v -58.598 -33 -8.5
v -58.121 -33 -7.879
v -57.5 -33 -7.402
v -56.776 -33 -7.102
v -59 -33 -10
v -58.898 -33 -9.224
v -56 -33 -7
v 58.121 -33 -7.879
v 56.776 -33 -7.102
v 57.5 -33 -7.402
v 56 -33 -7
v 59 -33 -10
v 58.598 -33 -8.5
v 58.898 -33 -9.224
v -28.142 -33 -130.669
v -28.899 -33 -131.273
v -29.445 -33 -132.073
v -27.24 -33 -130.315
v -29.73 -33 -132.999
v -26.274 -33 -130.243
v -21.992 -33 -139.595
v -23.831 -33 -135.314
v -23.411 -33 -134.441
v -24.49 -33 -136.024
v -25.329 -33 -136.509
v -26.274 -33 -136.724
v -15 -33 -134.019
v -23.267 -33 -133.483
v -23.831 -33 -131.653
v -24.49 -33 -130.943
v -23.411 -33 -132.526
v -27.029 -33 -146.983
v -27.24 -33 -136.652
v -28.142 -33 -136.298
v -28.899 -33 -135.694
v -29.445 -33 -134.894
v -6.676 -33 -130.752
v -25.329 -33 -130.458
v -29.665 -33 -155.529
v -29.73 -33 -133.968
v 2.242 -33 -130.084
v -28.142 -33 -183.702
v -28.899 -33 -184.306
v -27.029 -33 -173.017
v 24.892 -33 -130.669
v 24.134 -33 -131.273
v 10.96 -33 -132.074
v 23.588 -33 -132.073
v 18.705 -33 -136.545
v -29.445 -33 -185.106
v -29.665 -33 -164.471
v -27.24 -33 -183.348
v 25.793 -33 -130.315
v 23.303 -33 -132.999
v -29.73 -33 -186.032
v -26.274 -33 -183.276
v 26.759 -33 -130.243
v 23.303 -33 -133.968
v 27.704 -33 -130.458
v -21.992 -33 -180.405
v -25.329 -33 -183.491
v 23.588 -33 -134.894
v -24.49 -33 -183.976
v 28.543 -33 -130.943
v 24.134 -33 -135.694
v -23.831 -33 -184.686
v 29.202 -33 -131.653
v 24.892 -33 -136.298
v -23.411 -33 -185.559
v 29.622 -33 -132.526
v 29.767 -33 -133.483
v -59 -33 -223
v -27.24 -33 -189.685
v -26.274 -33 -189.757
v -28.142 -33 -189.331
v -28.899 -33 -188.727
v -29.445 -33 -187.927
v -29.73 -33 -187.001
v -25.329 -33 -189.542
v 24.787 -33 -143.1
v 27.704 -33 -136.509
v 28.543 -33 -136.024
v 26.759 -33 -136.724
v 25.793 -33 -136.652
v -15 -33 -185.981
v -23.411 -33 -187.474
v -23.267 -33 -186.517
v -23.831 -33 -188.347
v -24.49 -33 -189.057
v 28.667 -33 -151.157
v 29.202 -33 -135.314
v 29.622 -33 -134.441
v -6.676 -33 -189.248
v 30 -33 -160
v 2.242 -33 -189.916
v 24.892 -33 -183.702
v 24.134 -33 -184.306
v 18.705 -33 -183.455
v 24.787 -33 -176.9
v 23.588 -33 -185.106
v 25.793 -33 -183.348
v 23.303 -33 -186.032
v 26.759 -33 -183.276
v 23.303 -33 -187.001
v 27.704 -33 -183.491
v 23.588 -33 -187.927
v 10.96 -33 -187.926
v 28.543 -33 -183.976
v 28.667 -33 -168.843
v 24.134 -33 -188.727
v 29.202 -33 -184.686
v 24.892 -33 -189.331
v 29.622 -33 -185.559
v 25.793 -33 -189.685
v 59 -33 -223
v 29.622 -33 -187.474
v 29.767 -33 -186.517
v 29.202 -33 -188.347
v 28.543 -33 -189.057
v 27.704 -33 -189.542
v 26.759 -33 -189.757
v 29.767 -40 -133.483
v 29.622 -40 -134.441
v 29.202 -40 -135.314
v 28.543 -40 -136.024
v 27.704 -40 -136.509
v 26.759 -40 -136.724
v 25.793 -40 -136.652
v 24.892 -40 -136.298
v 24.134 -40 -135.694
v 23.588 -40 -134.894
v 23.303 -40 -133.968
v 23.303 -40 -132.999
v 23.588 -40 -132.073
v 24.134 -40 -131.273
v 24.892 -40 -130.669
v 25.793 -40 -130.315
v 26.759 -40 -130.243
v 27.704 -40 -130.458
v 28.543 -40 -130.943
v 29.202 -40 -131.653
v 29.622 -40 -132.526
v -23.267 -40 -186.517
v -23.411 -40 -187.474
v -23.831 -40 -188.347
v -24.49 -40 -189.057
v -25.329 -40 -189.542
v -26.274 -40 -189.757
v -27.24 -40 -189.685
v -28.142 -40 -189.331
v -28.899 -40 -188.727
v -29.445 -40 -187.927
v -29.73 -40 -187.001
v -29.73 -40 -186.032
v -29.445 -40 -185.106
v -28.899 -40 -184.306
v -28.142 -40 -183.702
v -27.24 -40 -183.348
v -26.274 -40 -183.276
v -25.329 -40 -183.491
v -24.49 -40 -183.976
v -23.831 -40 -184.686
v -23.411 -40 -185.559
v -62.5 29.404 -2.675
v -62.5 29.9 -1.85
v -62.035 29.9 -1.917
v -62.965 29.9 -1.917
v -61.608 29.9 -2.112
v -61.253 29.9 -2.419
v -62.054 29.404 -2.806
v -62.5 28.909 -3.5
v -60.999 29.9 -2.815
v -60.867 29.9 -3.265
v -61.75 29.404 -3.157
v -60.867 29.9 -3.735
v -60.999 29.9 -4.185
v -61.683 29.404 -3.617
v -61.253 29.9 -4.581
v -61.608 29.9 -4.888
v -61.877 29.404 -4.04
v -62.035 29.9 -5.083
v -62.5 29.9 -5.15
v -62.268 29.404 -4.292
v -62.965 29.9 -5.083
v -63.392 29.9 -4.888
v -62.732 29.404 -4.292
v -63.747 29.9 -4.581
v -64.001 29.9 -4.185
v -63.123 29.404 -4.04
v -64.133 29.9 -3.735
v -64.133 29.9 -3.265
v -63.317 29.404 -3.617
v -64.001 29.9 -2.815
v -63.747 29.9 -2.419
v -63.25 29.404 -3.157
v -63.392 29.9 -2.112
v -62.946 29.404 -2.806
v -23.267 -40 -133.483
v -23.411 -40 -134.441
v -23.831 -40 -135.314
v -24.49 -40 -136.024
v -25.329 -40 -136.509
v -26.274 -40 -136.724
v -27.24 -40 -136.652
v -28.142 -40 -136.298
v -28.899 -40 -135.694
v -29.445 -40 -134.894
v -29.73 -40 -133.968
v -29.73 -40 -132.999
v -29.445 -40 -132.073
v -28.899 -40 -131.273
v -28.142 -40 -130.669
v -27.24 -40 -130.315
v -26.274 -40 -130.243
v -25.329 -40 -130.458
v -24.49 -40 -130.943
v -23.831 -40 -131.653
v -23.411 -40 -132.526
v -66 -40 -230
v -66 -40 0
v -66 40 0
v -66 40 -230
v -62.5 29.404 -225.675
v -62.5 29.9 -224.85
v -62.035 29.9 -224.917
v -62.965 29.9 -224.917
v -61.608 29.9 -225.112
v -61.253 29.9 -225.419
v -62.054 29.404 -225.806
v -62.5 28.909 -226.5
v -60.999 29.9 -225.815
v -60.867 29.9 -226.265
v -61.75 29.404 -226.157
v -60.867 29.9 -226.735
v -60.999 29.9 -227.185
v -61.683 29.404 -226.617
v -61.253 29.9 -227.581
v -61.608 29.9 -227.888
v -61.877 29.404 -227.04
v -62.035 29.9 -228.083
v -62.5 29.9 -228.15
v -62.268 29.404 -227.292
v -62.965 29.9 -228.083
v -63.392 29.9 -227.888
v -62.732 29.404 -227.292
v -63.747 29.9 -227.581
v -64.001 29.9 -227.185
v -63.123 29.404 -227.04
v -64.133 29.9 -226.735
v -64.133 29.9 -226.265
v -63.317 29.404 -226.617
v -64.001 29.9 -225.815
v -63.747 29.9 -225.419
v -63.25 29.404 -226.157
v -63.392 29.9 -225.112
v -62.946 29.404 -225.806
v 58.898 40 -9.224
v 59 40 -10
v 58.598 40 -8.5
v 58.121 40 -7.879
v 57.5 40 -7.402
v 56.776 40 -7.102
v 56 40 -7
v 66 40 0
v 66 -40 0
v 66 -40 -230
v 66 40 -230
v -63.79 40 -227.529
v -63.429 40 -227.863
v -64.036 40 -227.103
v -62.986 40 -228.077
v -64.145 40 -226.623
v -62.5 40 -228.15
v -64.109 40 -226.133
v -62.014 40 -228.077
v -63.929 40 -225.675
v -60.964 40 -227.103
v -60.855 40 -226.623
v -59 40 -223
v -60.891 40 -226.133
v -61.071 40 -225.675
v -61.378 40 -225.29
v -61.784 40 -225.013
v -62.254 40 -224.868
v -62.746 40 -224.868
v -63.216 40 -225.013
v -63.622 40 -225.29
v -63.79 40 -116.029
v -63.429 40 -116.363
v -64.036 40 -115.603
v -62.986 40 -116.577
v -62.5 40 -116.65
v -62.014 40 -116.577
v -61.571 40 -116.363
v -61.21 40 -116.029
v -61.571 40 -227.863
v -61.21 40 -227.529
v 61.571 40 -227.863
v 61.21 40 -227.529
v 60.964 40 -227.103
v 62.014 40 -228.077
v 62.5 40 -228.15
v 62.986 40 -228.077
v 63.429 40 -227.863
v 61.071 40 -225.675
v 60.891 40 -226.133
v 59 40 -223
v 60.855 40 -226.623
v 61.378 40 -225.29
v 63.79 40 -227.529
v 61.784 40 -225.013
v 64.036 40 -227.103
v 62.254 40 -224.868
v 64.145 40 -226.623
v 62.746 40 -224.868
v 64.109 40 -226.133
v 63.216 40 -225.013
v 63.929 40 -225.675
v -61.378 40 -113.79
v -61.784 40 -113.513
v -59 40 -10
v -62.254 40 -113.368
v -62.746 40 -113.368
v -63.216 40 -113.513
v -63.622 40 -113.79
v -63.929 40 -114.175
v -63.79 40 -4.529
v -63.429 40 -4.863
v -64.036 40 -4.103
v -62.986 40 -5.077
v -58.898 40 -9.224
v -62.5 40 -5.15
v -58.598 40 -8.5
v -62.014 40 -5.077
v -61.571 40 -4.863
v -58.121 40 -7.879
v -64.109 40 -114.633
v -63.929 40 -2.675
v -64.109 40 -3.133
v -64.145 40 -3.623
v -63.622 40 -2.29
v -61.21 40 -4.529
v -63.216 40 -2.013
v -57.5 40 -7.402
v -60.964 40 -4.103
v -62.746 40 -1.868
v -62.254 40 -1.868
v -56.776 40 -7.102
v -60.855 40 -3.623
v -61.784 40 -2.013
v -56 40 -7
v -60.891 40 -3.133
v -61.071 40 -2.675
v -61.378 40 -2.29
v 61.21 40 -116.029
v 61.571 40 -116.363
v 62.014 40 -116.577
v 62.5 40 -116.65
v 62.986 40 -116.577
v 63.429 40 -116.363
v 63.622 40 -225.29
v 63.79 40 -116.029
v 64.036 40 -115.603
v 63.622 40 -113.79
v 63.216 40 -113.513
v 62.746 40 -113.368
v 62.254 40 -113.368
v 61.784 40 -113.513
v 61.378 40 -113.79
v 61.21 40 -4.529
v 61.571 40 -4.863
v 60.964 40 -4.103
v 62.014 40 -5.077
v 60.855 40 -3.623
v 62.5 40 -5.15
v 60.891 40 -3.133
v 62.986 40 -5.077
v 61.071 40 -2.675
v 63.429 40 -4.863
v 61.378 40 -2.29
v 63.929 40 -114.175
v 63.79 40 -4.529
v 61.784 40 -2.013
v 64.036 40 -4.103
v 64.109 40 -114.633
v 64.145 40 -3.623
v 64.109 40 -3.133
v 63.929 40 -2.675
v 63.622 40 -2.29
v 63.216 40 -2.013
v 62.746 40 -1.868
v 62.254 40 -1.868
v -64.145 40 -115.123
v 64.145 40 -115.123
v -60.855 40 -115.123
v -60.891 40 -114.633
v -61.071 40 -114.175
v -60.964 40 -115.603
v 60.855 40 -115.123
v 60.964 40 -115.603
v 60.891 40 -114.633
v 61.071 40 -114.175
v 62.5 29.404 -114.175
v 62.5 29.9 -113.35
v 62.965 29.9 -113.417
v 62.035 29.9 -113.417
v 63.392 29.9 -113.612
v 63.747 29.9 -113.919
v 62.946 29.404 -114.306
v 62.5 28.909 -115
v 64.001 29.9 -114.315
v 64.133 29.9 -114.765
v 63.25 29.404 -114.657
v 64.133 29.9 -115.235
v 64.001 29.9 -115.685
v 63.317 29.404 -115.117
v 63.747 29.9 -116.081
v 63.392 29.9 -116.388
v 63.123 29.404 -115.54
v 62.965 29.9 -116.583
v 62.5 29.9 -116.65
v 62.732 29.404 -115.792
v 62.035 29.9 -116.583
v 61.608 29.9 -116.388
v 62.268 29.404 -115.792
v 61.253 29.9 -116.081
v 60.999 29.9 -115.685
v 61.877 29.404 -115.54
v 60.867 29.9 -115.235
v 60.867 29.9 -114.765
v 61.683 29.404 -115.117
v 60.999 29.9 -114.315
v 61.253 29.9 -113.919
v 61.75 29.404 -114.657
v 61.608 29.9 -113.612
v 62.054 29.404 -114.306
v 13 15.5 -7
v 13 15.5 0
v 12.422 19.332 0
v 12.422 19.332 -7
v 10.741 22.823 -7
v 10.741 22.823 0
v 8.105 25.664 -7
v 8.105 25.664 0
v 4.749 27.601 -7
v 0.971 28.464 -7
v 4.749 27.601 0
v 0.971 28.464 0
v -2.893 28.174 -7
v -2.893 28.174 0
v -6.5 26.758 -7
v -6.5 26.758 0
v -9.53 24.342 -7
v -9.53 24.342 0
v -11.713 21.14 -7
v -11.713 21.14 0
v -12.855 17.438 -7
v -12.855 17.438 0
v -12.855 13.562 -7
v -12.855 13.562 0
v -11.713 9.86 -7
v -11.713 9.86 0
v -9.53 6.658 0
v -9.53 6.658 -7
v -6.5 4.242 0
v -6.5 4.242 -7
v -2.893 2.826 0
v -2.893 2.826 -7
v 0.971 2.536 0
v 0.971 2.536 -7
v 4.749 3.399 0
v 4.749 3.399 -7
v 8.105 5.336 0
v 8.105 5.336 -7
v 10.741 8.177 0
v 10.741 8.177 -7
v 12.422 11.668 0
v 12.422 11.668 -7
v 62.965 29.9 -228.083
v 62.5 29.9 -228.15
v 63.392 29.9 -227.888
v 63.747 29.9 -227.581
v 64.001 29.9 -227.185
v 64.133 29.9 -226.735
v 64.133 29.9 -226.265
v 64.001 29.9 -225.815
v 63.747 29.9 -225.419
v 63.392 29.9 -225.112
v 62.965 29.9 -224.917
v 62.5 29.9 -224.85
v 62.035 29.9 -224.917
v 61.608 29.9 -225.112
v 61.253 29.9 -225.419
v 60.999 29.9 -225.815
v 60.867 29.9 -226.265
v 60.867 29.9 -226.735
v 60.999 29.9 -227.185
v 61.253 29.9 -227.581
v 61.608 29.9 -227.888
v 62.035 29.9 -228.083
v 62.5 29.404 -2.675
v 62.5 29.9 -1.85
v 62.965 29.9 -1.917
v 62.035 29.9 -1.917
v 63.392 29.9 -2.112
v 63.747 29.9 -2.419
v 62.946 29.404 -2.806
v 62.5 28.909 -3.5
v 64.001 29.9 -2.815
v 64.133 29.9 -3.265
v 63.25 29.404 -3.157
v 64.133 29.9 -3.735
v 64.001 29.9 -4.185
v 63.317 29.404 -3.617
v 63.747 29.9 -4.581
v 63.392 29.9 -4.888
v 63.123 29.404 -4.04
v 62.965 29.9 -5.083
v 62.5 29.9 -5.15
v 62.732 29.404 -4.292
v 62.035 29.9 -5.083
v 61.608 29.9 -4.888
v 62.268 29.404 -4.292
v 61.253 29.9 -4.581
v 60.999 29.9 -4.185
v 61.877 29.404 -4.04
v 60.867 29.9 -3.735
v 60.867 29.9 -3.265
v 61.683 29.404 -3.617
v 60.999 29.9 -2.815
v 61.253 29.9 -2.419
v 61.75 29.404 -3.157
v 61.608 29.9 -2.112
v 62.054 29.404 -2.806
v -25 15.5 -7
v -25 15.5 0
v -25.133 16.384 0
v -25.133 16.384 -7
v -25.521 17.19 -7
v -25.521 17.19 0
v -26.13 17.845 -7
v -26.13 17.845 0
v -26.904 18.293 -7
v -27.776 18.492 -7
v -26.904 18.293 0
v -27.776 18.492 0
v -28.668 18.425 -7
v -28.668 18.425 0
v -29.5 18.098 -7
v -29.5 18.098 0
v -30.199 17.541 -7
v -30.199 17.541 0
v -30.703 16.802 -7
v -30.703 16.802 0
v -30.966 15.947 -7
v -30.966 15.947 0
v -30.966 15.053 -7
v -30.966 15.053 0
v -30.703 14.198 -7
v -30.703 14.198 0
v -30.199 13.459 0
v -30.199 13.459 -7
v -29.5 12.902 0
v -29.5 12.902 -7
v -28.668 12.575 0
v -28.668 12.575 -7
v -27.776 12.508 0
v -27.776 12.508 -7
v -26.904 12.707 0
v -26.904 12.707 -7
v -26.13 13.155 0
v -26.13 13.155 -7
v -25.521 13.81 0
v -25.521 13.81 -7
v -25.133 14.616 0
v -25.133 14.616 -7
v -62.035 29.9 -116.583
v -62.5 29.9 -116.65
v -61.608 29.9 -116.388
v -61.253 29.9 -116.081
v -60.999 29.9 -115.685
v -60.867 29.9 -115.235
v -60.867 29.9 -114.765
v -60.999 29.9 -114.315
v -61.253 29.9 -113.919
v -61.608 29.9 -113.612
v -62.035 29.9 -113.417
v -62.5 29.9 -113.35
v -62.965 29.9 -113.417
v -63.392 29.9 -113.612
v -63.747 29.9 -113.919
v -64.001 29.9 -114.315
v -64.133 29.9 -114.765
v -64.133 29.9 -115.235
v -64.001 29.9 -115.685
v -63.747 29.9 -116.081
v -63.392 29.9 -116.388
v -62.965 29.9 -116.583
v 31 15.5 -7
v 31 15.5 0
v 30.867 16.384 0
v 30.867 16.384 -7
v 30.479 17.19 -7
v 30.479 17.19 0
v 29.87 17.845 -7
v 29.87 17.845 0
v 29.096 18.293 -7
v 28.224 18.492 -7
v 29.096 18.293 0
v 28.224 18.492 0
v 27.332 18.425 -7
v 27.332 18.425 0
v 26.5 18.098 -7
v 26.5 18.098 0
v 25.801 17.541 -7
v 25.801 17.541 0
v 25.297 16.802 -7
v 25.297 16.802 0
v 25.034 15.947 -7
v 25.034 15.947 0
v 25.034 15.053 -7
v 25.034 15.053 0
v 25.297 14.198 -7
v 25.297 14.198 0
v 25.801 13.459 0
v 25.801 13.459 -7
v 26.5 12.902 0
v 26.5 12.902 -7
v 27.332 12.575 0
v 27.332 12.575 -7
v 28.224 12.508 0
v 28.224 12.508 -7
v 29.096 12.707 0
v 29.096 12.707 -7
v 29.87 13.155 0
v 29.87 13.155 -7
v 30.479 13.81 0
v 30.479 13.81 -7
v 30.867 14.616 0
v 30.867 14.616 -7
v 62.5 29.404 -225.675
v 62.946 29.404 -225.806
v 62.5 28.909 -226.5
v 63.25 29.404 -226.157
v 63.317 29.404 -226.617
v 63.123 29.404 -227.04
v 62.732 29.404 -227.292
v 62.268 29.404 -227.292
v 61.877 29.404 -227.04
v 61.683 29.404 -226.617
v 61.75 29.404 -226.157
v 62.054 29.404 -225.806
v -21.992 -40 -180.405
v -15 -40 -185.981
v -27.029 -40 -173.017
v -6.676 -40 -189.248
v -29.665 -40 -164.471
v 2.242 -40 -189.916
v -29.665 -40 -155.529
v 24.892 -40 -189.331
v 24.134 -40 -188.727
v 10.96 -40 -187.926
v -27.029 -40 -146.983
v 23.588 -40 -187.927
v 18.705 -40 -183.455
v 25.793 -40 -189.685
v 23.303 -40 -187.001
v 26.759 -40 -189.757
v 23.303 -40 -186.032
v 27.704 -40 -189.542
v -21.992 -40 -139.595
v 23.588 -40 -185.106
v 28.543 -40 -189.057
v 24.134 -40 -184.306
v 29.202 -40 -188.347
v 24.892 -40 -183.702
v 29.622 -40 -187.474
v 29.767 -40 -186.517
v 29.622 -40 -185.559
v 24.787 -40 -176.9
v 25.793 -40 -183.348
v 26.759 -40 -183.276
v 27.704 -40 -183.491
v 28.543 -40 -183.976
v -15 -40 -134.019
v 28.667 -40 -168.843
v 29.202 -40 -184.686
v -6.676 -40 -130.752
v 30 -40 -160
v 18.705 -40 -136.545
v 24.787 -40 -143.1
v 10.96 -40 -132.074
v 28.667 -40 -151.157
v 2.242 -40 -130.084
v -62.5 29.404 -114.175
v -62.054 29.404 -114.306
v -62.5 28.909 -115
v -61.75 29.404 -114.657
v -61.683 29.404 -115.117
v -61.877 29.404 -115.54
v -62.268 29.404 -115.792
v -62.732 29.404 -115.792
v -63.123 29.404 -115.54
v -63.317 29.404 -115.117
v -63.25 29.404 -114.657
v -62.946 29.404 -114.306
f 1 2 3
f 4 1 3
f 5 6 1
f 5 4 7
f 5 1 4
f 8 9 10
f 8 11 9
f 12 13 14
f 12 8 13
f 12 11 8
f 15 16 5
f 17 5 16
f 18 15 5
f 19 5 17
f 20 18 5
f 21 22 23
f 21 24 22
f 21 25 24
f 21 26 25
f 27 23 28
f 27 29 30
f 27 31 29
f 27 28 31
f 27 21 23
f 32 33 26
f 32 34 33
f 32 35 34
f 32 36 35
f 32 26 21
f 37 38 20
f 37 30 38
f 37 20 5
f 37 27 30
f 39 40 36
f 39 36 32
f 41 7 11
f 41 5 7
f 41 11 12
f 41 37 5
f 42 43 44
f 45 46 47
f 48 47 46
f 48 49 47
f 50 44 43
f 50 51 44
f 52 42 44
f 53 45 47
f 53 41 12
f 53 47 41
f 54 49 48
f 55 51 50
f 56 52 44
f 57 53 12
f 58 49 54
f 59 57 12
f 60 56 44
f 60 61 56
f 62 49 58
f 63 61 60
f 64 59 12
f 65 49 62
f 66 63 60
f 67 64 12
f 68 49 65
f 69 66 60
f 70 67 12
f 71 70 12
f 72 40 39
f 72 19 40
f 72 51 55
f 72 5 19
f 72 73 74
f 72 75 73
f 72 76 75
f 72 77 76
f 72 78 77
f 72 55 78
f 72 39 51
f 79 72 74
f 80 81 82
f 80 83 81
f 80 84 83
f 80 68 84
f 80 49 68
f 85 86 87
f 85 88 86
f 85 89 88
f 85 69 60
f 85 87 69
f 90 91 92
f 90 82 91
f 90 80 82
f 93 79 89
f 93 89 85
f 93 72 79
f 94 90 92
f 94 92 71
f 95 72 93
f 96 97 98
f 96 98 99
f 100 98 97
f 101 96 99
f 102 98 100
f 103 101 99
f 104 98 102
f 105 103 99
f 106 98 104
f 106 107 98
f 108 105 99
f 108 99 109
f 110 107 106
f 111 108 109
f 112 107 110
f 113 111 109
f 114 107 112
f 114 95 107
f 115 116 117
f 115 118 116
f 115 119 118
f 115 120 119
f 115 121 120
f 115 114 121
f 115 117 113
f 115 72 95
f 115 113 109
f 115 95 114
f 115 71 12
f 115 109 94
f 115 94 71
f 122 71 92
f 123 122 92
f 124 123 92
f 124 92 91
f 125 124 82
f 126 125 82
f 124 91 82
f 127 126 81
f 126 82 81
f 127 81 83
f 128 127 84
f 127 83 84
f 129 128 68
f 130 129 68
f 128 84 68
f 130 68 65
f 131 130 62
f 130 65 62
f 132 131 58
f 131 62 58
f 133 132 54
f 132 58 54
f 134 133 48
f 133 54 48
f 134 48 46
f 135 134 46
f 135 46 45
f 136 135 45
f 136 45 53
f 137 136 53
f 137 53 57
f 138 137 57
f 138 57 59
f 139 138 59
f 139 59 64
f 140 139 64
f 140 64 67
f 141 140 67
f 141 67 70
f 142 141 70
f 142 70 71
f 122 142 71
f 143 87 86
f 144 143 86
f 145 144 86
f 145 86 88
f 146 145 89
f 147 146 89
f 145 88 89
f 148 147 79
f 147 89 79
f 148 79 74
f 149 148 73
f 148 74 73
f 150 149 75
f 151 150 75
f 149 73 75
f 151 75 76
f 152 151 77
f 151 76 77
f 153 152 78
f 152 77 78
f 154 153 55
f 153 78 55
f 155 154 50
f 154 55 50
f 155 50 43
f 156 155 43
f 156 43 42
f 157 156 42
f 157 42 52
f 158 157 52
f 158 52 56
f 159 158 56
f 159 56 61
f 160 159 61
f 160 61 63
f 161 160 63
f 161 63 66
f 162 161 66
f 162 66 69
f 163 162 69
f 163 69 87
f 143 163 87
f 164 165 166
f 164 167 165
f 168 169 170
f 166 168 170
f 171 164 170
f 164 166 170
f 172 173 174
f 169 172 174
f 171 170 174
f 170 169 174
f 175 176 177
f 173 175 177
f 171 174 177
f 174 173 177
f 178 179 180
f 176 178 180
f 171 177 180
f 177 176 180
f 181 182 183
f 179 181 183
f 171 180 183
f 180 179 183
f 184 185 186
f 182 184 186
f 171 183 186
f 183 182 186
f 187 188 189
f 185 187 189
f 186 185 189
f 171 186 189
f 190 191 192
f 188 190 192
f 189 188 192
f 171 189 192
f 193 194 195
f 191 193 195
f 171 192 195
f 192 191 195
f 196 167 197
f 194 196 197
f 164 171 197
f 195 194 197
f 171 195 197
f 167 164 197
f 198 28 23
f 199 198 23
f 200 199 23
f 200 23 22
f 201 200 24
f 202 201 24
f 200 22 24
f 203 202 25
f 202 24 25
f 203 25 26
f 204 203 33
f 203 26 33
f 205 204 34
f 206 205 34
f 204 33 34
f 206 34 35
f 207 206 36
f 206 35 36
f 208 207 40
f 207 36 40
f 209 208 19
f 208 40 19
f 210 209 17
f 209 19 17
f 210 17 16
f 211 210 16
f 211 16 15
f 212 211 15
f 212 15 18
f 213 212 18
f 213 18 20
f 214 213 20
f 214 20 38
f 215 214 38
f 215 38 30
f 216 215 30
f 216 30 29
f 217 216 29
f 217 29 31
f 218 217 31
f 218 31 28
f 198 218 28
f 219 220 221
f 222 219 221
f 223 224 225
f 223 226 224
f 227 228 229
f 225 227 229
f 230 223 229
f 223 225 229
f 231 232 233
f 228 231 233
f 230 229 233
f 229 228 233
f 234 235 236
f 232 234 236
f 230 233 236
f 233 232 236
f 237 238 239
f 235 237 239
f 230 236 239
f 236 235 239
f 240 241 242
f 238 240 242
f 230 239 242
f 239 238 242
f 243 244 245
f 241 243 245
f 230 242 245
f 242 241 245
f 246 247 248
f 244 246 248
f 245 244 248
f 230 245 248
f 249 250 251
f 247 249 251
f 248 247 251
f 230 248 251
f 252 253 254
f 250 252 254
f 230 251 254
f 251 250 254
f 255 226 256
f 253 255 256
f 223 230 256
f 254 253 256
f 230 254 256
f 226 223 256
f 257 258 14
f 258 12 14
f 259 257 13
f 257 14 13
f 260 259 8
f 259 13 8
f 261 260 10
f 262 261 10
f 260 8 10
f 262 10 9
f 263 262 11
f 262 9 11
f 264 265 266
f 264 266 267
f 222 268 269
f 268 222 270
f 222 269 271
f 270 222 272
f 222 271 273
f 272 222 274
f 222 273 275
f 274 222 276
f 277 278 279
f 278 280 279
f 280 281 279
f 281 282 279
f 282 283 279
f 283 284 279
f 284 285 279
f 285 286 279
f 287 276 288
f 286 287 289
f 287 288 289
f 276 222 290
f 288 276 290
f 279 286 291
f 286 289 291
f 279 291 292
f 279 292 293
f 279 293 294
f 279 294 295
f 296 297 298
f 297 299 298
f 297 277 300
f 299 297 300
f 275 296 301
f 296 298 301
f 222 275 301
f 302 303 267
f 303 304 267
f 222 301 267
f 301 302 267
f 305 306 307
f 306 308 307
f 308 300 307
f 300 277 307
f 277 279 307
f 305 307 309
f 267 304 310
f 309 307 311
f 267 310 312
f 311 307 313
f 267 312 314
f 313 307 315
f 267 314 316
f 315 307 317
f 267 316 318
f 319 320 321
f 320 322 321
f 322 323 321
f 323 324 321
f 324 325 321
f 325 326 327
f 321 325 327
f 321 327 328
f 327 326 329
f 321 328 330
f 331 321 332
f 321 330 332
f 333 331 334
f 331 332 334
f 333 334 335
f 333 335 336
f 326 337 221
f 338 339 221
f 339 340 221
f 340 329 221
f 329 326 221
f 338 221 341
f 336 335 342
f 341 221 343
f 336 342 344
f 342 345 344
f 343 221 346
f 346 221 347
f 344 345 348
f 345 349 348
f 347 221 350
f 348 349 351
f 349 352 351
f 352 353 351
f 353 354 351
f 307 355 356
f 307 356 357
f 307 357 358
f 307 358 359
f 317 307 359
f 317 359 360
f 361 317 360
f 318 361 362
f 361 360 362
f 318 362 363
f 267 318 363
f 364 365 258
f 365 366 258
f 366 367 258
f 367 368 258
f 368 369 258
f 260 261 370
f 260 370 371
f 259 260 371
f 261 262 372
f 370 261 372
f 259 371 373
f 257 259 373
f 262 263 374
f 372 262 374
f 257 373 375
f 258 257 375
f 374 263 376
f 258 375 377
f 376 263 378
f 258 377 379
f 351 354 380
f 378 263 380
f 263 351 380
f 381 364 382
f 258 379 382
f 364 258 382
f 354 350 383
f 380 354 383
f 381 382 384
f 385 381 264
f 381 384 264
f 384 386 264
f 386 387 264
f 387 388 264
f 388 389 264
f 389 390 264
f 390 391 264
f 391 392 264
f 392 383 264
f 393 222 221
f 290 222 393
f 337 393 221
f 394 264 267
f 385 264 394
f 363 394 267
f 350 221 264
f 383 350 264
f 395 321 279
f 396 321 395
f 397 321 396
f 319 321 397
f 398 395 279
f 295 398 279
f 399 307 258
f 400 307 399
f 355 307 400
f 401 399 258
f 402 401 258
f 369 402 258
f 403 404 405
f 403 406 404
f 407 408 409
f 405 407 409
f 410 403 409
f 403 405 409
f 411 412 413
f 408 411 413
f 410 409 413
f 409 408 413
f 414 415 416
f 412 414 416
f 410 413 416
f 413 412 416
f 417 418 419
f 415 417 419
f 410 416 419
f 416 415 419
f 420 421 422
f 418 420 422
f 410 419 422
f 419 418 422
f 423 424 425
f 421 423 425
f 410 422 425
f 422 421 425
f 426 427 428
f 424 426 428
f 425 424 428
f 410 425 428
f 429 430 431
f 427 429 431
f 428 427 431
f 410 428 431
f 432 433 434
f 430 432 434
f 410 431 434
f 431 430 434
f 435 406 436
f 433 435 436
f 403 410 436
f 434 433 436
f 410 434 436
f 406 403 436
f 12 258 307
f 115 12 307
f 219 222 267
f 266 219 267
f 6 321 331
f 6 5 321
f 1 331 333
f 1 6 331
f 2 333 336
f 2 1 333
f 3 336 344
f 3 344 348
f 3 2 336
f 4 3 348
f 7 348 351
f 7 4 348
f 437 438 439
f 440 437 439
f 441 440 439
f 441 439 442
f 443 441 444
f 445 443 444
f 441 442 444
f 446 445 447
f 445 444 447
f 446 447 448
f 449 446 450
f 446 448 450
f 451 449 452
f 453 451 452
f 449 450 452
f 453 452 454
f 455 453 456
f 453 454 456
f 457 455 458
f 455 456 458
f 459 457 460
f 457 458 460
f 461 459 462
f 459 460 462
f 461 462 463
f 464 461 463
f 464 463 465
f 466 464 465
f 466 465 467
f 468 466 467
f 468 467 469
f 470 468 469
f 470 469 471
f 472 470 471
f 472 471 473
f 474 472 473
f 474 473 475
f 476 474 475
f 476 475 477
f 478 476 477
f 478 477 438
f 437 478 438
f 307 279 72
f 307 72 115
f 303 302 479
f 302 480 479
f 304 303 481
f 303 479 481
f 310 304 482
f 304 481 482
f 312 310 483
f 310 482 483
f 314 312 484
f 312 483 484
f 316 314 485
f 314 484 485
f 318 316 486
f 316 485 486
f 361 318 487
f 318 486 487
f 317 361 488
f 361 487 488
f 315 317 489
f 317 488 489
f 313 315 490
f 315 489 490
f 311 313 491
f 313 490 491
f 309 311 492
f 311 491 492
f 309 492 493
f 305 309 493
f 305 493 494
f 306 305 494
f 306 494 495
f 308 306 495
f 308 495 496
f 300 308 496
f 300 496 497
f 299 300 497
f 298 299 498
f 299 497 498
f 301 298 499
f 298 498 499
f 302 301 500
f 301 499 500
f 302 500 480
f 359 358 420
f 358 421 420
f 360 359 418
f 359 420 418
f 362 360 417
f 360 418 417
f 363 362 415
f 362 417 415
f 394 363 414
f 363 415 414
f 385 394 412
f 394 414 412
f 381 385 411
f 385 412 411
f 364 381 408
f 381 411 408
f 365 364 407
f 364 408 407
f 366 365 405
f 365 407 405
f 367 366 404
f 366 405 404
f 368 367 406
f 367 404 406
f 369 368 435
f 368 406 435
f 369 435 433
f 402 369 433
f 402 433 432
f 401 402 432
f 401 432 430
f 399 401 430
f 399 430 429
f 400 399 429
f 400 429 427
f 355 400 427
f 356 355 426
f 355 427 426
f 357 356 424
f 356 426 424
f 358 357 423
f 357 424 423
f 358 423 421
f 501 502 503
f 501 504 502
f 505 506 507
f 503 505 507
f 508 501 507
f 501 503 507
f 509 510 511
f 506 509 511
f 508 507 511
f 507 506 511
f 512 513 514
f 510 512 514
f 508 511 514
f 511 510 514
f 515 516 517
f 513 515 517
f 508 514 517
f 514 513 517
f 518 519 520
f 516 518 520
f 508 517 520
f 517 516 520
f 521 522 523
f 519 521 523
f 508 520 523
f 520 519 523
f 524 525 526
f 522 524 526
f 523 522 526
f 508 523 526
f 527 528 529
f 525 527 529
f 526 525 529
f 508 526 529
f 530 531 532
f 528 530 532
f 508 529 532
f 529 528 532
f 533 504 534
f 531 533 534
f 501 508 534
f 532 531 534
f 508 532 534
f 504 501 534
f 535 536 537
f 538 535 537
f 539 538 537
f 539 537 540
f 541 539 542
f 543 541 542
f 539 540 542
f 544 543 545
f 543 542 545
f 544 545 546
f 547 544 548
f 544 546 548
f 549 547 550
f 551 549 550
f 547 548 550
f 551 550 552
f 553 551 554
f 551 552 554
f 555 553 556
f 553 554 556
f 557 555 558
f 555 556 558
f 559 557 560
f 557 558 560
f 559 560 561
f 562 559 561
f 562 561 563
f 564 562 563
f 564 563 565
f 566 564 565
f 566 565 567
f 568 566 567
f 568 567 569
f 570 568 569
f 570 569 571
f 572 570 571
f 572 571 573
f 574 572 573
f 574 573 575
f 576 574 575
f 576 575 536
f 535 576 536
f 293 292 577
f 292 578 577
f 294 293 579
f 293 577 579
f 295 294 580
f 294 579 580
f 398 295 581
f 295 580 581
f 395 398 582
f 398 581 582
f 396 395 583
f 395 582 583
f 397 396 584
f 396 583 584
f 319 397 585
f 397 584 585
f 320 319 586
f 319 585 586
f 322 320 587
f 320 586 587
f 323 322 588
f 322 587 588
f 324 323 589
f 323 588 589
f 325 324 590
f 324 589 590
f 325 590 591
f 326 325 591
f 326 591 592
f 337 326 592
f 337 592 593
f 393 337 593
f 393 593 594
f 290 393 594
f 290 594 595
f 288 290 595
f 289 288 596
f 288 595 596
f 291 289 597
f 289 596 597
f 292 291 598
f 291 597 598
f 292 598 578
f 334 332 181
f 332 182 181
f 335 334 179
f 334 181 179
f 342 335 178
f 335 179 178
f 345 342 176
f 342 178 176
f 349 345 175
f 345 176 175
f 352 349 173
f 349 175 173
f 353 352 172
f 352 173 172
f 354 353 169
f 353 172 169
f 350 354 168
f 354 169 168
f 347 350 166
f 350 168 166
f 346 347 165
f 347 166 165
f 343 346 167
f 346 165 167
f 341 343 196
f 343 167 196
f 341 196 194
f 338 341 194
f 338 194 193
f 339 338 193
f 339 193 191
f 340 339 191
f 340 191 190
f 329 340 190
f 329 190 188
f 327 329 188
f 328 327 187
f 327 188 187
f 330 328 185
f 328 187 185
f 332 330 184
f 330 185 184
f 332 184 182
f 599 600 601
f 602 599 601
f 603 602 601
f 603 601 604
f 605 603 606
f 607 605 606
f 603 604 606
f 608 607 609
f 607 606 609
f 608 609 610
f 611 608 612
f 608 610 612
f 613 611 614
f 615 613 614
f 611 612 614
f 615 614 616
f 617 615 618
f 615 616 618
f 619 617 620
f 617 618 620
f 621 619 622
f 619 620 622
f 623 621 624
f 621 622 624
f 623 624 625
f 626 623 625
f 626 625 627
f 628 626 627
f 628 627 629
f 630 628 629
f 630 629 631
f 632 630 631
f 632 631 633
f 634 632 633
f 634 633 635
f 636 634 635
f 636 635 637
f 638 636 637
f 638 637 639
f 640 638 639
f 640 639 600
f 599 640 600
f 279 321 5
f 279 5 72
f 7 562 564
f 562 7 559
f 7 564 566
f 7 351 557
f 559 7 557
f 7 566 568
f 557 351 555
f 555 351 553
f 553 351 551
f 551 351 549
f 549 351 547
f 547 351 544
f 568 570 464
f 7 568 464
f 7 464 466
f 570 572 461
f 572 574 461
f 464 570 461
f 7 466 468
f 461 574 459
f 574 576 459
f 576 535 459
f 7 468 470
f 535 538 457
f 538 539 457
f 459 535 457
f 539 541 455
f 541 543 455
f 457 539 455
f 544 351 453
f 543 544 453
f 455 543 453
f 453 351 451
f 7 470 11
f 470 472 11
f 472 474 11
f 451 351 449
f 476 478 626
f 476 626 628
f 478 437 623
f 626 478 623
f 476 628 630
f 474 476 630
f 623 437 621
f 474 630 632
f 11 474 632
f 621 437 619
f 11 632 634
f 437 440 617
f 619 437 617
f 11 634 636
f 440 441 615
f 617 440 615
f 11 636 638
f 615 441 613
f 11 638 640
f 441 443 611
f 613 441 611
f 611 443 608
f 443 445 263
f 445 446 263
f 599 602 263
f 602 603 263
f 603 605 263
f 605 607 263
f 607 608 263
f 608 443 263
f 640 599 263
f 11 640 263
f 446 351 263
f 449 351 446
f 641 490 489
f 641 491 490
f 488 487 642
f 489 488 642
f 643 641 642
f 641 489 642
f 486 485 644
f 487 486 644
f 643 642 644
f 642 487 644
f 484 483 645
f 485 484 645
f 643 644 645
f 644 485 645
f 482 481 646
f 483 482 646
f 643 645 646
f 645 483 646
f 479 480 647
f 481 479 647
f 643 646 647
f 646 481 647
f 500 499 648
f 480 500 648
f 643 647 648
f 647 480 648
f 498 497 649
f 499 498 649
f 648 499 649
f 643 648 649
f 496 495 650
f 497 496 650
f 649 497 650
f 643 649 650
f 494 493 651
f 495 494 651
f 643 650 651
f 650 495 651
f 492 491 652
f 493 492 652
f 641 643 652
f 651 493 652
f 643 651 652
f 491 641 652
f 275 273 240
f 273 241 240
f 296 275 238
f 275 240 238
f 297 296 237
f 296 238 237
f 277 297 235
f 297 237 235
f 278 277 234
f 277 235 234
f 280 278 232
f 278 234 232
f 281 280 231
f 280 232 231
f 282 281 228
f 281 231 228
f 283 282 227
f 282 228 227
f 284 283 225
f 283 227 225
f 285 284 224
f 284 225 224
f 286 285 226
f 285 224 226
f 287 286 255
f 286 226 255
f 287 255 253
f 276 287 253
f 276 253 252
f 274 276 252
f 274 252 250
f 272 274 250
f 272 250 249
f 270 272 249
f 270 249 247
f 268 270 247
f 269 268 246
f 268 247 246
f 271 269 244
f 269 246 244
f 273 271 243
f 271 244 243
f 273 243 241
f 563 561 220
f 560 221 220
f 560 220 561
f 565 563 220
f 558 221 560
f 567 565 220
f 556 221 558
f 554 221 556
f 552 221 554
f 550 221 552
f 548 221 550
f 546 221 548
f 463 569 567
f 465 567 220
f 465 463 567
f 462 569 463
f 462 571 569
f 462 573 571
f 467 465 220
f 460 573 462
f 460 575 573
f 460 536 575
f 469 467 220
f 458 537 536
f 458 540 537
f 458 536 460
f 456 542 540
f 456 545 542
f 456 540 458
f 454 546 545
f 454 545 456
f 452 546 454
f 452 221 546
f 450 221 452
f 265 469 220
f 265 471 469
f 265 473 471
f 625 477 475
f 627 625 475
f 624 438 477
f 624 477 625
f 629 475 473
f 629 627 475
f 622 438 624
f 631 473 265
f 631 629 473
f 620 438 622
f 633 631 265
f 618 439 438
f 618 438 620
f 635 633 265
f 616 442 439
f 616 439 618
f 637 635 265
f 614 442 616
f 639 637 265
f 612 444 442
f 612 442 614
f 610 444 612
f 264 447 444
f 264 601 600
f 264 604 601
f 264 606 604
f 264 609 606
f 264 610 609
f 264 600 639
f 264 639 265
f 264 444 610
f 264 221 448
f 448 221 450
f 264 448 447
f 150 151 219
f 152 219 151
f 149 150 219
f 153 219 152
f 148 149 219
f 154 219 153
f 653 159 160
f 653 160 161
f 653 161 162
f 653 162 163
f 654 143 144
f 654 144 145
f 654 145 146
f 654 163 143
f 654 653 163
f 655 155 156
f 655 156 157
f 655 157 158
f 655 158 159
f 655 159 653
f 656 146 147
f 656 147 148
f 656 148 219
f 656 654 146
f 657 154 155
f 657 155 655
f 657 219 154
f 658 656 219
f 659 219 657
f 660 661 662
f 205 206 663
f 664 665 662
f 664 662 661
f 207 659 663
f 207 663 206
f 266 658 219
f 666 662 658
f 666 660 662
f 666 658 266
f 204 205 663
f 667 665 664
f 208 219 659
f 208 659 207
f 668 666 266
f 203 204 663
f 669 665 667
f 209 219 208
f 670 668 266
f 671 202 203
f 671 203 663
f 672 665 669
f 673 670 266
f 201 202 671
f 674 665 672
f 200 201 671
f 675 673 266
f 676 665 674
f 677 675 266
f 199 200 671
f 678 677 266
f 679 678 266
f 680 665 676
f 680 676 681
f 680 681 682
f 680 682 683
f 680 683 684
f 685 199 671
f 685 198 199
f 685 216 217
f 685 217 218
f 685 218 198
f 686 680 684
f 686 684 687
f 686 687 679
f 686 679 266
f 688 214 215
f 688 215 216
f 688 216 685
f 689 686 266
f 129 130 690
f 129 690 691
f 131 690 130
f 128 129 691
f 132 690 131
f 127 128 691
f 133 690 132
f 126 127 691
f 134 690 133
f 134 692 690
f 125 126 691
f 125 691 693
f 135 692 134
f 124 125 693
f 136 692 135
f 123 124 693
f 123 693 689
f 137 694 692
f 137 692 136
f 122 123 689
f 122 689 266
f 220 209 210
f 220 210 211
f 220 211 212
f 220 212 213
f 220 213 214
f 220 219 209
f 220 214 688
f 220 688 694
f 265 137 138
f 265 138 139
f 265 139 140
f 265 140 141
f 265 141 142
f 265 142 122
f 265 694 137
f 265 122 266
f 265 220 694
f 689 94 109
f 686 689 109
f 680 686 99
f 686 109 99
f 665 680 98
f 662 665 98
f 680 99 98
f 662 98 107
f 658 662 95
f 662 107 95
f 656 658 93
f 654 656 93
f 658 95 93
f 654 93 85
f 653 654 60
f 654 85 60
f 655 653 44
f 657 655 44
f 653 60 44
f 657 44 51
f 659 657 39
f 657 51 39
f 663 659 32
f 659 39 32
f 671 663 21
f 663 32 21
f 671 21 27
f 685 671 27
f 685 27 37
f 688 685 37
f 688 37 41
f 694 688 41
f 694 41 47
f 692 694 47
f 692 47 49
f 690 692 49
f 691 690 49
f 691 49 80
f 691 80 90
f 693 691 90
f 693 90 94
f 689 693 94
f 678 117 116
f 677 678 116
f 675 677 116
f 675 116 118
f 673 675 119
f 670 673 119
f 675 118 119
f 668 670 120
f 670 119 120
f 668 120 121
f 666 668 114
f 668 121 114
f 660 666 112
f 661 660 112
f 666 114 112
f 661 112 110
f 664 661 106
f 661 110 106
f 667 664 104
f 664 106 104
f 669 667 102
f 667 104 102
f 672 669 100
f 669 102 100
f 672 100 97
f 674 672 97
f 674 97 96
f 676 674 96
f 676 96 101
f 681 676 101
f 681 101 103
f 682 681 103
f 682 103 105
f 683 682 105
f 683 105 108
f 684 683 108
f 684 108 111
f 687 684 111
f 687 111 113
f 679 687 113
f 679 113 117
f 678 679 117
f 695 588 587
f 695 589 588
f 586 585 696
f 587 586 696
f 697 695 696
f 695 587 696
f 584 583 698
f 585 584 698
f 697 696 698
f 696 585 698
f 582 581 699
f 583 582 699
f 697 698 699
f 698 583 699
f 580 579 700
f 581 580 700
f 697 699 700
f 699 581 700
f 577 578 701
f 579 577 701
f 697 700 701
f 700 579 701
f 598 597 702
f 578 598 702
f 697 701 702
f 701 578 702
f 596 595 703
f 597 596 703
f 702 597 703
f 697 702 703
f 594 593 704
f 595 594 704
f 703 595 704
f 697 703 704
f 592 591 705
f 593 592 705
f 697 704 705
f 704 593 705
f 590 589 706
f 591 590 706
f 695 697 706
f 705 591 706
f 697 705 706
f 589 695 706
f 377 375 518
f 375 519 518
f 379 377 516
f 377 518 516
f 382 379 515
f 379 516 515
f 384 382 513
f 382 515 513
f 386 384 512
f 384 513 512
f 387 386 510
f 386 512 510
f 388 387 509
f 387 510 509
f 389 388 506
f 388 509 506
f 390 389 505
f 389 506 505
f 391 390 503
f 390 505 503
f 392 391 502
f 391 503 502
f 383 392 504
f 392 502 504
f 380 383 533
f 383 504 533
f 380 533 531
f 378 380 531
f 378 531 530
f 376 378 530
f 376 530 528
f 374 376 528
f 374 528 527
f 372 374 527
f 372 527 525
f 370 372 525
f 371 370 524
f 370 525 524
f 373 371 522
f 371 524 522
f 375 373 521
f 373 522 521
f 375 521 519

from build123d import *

# Parameters (mm, degrees)
SKETCH_1_W             = 132
SKETCH_1_H             = 80
EXTRUDE_1_DEPTH        = 230
SKETCH_2_W             = 118
SKETCH_2_H             = 216
CUT_EXTRUDE_1_DEPTH    = 73
SKETCH_3_R             = 13
SKETCH_3_R_2           = 3
CUT_EXTRUDE_2_DEPTH    = 10
SKETCH_4_R             = 3.25
SKETCH_4_R_2           = 30
CUT_EXTRUDE_3_DEPTH    = 10
FILLET_1_R             = 3
HOLE_WIZARD_M4_1_D     = 3.3
HOLE_WIZARD_M4_1_DEPTH = 10.1
HOLE_WIZARD_M4_1_TIP   = 0.991420021


with BuildPart() as part:
    # 草图1 → 凸台-拉伸1 (new body)
    with BuildSketch(Plane.XY):
        Rectangle(SKETCH_1_W, SKETCH_1_H)
    extrude(amount=-EXTRUDE_1_DEPTH)

    # 草图2 → 切除-拉伸1 (cut)
    with BuildSketch(Plane(origin=(0, 40, 0), x_dir=(1, 0, 0), z_dir=(0, 1, 0))):
        with Locations((0, 115)):
            Rectangle(SKETCH_2_W, SKETCH_2_H)
    extrude(amount=-CUT_EXTRUDE_1_DEPTH, mode=Mode.SUBTRACT)

    # 草图3 → 切除-拉伸2 (cut)
    with BuildSketch(Plane.XY):
        with Locations((0, 15.5)):
            Circle(SKETCH_3_R)
        with Locations((-28, 15.5)):
            Circle(SKETCH_3_R_2)
        with Locations((28, 15.5)):
            Circle(SKETCH_3_R_2)
    extrude(amount=-CUT_EXTRUDE_2_DEPTH, mode=Mode.SUBTRACT)

    # 草图4 → 切除-拉伸3 (cut)
    with BuildSketch(Plane(origin=(0, -33, 0), x_dir=(1, 0, 0), z_dir=(0, 1, 0))):
        with Locations((26.516504294, 186.516504294)):
            Circle(SKETCH_4_R)
        with Locations((26.516504294, 133.483495706)):
            Circle(SKETCH_4_R)
        with Locations((-26.516504294, 133.483495706)):
            Circle(SKETCH_4_R)
        with Locations((-26.516504294, 186.516504294)):
            Circle(SKETCH_4_R)
        with Locations((0, 160)):
            Circle(SKETCH_4_R_2)
    extrude(amount=-CUT_EXTRUDE_3_DEPTH, mode=Mode.SUBTRACT)

    # 圆角1
    fillet_1_edges = [part.edges().sort_by_distance(p)[0] for p in [
        (-59, 3.5, -7),
        (59, 3.5, -7),
    ]]
    fillet(fillet_1_edges, radius=FILLET_1_R)

    # M4 螺纹孔1
    with Locations(Plane(origin=(-62.5, 40, -226.5), x_dir=(0, 0, 1), z_dir=(0, 1, 0))):
        with Locations((0, 0), (111.5, 0), (111.5, 125), (0, 125), (223, 125), (223, 0)):
            Hole(HOLE_WIZARD_M4_1_D / 2, depth=HOLE_WIZARD_M4_1_DEPTH)
            with Locations((0, 0, -(HOLE_WIZARD_M4_1_DEPTH + HOLE_WIZARD_M4_1_TIP / 2))):  # 118° drill point
                Cone(0, HOLE_WIZARD_M4_1_D / 2, HOLE_WIZARD_M4_1_TIP, mode=Mode.SUBTRACT)


solid = part.part
